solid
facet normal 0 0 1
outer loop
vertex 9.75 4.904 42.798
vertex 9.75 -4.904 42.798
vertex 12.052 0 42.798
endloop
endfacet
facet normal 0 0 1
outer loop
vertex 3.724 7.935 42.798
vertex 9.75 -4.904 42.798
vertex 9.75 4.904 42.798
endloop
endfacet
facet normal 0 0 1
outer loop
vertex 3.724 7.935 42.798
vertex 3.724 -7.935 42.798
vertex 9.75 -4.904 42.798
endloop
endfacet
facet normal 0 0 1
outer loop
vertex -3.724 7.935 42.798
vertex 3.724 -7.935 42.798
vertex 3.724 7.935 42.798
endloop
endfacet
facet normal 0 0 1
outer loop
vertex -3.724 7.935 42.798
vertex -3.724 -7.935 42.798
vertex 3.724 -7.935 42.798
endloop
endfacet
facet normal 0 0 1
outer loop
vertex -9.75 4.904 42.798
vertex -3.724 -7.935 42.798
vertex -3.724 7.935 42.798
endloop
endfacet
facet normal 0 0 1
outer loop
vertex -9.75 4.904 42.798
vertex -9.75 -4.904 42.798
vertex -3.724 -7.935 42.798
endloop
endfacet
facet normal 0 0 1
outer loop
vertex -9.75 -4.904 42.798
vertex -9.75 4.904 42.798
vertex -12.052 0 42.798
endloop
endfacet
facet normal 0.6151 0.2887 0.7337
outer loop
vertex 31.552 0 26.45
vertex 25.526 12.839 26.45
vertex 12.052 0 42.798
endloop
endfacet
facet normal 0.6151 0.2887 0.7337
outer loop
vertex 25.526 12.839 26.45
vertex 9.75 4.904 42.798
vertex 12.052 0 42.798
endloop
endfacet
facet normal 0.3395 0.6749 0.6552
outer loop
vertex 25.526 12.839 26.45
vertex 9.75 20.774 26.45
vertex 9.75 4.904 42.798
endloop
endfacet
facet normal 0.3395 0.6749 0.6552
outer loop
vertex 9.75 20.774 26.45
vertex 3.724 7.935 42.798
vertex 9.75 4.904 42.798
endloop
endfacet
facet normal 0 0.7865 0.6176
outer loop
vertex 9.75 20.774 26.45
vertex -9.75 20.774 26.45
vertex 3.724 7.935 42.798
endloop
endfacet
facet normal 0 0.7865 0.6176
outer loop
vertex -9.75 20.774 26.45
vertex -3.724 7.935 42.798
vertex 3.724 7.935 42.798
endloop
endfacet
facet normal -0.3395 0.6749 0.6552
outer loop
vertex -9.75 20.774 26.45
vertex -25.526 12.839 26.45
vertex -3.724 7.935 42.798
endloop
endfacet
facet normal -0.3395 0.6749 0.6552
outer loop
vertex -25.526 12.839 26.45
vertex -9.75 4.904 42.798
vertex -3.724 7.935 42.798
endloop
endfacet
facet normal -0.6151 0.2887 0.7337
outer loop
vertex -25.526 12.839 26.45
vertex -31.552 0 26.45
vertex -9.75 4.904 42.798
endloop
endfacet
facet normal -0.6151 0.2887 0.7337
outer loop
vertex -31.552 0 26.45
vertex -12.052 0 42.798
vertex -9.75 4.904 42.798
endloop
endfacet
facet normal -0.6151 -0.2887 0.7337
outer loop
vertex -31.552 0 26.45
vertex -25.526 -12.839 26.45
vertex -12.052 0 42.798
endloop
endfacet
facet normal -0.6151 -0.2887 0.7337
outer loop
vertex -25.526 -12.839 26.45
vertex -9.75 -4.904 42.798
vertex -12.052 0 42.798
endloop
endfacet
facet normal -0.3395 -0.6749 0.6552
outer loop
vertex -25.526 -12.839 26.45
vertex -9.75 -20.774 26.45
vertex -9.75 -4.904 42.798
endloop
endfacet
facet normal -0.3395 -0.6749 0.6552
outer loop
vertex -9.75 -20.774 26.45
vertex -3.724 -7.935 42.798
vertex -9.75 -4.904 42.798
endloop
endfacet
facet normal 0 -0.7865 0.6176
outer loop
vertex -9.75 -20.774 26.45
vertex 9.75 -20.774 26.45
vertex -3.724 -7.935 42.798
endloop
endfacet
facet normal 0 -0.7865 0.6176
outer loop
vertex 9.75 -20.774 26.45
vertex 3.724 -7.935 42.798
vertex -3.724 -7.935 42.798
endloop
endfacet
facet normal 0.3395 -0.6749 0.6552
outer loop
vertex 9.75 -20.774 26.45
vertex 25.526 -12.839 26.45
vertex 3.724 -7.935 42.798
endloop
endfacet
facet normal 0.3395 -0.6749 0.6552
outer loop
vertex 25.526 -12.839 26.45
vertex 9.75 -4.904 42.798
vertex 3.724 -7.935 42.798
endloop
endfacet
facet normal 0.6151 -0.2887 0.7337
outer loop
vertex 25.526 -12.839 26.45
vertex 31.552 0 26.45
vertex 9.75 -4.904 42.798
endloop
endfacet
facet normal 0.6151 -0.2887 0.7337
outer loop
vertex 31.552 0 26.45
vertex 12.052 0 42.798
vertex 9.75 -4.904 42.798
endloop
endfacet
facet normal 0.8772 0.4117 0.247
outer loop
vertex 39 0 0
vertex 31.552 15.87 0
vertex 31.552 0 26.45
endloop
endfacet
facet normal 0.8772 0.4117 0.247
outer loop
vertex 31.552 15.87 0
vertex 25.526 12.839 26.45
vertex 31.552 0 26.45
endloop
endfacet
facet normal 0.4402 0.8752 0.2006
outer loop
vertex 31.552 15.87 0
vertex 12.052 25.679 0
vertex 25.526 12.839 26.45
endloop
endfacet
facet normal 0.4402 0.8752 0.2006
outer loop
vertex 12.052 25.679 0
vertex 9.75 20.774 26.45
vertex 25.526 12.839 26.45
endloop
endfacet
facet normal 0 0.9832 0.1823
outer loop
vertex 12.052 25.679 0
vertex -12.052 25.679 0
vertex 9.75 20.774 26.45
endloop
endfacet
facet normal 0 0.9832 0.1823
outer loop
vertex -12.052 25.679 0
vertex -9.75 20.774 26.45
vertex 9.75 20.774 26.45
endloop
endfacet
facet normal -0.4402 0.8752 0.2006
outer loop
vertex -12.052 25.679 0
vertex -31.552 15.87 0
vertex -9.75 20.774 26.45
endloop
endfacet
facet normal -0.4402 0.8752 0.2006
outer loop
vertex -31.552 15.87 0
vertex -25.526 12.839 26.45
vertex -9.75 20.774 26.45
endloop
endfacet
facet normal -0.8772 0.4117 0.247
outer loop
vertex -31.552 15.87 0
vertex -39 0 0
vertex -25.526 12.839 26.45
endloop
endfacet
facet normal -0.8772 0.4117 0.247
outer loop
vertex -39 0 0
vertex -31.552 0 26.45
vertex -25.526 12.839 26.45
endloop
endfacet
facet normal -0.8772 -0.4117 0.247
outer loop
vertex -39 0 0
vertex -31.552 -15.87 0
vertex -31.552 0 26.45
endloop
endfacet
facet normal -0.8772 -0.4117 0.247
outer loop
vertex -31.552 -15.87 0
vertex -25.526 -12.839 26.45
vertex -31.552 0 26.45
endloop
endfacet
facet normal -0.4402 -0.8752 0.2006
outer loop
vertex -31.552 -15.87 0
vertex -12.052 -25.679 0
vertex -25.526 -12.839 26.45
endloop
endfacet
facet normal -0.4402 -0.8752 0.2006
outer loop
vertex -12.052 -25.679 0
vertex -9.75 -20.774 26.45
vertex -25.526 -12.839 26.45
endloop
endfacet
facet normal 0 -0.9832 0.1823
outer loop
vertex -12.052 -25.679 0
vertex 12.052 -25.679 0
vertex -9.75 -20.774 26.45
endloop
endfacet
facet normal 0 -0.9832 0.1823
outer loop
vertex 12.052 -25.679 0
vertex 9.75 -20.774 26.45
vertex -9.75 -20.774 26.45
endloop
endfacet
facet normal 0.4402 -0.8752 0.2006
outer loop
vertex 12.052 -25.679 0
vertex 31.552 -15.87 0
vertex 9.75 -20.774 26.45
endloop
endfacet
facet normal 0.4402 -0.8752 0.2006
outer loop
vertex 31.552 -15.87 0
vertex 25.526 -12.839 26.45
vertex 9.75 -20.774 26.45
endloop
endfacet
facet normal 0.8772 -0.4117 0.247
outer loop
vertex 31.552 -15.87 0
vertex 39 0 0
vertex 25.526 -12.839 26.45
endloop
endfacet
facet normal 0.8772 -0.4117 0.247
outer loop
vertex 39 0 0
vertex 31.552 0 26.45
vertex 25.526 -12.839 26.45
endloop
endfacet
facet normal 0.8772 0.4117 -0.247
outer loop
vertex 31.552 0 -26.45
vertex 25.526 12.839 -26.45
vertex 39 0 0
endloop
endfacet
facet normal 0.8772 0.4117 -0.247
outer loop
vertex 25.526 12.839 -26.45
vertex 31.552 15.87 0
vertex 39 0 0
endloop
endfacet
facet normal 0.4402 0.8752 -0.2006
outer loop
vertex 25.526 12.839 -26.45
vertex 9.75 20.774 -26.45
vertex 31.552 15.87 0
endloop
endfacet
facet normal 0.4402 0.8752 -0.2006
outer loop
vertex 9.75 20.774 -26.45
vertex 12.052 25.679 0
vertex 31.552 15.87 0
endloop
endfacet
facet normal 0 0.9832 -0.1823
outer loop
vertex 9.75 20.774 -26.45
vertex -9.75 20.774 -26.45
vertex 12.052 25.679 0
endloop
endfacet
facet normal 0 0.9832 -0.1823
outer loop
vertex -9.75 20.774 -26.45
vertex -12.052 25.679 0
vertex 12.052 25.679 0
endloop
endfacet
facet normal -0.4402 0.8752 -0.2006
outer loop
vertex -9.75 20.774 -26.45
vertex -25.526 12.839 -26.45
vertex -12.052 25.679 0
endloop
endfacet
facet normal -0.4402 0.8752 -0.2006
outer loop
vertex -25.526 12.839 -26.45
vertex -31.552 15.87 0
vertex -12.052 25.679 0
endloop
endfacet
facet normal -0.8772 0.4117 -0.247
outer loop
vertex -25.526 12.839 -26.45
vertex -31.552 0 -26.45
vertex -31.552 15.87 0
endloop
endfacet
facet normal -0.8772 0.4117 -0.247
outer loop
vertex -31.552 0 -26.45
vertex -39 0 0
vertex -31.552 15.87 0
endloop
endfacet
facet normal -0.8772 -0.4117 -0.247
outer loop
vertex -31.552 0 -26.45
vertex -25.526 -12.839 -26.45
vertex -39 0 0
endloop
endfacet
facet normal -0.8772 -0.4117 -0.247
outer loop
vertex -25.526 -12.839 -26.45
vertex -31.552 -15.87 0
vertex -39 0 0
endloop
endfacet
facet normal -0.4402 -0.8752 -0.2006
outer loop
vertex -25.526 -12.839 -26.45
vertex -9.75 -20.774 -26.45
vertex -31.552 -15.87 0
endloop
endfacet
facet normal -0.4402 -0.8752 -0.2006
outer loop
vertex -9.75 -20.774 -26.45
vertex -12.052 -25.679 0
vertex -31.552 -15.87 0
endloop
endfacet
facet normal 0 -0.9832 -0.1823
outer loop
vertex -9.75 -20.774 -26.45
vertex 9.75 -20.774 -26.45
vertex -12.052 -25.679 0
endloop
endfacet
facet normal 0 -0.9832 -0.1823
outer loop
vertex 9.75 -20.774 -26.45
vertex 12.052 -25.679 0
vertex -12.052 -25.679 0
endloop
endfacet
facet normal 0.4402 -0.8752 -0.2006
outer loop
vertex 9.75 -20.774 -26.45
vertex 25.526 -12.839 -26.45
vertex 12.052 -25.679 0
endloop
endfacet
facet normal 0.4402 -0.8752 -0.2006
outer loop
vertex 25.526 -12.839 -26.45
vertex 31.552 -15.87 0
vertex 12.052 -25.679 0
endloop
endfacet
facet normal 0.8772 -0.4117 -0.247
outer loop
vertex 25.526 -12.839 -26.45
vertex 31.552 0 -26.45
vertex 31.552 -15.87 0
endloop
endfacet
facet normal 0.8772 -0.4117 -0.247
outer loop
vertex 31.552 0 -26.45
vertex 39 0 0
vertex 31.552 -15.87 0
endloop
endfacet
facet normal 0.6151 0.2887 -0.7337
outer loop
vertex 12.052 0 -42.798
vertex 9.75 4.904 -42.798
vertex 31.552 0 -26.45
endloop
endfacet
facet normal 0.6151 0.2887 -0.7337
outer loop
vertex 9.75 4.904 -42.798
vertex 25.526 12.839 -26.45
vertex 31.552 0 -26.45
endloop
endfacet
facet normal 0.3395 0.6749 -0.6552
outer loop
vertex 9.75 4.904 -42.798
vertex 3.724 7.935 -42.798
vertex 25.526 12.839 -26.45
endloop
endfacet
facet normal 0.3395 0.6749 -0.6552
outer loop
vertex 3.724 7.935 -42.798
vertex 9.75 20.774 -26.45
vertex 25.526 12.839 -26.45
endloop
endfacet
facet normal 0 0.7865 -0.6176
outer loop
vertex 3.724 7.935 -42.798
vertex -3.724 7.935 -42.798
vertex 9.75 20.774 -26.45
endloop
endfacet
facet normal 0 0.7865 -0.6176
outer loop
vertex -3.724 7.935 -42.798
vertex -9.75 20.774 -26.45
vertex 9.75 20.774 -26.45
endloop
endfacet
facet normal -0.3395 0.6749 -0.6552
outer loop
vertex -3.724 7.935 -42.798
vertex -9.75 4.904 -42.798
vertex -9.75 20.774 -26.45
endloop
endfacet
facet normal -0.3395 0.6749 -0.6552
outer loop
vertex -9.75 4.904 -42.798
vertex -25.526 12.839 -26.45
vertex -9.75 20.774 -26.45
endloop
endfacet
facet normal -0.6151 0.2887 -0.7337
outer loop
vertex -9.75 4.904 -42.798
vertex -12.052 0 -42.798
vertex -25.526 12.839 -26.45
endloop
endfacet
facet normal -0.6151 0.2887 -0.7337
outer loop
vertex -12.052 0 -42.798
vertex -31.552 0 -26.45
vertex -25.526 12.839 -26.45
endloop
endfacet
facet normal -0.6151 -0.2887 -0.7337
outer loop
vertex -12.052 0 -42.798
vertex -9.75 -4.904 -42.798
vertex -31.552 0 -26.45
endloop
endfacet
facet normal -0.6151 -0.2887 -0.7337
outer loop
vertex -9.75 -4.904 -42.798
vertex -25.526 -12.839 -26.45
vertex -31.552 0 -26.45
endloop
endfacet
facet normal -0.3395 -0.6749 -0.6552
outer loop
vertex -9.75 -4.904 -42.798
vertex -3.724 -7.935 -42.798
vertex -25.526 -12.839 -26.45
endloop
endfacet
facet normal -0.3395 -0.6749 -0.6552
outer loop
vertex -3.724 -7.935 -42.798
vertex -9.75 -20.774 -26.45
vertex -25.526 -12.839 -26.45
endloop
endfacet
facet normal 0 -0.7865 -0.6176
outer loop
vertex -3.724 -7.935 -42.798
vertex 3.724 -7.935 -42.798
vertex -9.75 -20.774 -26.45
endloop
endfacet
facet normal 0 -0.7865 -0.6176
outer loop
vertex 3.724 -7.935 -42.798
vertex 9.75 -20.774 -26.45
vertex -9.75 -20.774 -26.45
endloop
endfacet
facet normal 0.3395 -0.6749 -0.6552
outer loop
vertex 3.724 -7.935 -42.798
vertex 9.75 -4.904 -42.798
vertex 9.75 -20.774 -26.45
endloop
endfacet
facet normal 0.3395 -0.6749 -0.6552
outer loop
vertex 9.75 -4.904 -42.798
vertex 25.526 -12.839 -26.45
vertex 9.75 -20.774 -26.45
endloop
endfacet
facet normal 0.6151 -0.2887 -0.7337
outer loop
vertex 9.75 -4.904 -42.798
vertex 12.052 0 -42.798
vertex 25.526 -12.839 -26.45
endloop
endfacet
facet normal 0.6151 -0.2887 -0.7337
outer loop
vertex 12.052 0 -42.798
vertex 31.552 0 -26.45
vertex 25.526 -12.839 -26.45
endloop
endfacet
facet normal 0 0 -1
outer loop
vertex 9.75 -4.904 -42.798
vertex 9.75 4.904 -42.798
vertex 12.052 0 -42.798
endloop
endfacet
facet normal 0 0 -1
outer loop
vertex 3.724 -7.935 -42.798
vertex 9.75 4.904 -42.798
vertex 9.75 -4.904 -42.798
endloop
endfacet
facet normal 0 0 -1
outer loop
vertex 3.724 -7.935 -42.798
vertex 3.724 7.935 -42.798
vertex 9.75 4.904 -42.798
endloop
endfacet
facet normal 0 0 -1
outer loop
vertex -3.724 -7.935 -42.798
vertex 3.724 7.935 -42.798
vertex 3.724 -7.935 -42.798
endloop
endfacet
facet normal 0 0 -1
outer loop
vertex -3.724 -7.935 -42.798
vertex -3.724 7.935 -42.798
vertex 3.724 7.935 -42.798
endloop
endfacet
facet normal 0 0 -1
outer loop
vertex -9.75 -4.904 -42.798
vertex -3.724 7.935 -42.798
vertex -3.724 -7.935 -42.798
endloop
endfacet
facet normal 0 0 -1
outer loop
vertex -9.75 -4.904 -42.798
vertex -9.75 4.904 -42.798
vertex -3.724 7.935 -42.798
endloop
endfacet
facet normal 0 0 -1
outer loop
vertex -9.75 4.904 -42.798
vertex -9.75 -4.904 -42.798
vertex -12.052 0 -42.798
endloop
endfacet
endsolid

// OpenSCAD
// Generated by SolidPython 1.0.1 on 2020-07-29 00:46:50


scale(v = [13, 9, 15]) {
	sphere(r = 3);
}
/***********************************************
*********      SolidPython code:      **********
************************************************
 
# import packages: SolidPython
from solid import *
from solid.utils import *
from itertools import chain, combinations, permutations


class Resize:

    def __init__(self, scad_file):
        self.scad_file = scad_file
        #self.scad_file = import_scad(scad_file)
        # cone/cylinder param:
        self.r1 = 0
        self.r2 = 0
        self.h = 0
        # rectangular prism param:
        self.w = 0
        self.l = 0
        # ellipse param:
        self.r = 0

    # import OpenScad code (file name corresponds to shape)


    # classify shape + parameters
    def assign(self, param1, param2, param3):
        if self.scad_file == 'cone.scad':
            self.r1 = param1
            self.r2 = param2
            self.h = param3
        elif self.scad_file == 'cylinder.scad':
            self.r1 = param1
            self.r2 = param2
            self.h = param3
        elif self.scad_file == 'rectangularPrism.scad':
            self.h = param1
            self.l = param2
            self.w = param3
        else:
            self.r = param1
            self.h = param2

    # resize parameters
    def iterate(self):
        x = range(3, 20, 2)
        i = 1
        if self.scad_file == 'cone.scad':
            tempList = list(permutations(x, 2))
            for temp in tempList:
                param1 = temp[0]
                param2 = temp[1]
                filepath = 'produced_scad_files/' + 'cone' + str(param1) + '_' + str(param2) + '_' + '.scad'
                scad_render_to_file(cylinder(h=param1, r1=param2, r2=0), filepath)

        elif self.scad_file == 'cylinder.scad':
            tempList = list(permutations(x, 3))
            for temp in tempList:
                param1 = temp[0]
                param2 = temp[1]
                filepath = 'produced_scad_files/' + 'cylinder' + str(param1) + '_' + str(param2) + '_' + '.scad'
                scad_render_to_file(cylinder(h=param1, r1=param2, r2=param2), filepath)

        elif self.scad_file == 'rectangularPrism.scad':
            tempList = list(permutations(x, 3))
            for temp in tempList:
                param1 = temp[0]
                param2 = temp[1]
                param3 = temp[2]
                filepath = 'produced_scad_files/' + 'rectangularPrism' + str(param1) + '_' + str(param2) + '_' + str(
                    param3) + '.scad'
                scad_render_to_file(cube(size=(param1, param2, param3)), filepath)

        elif self.scad_file == 'ellipse.scad':
            tempList = list(permutations(x, 4))
            for temp in tempList:
                param1 = temp[0]
                param2 = temp[1]
                param3 = temp[2]
                param4 = temp[3]
                filepath = 'produced_scad_files/' + 'ellipse' + str(param1) + '_' + str(param2) + '_' + str(param3) + '_' + str(param4) + '.scad'
                scad_render_to_file(scale([param1, param2, param3])(sphere(r=param4)), filepath)

    def render_to_scadfile(self):
        scad_render_to_file(scad, 'example.scad') 
 
************************************************/
